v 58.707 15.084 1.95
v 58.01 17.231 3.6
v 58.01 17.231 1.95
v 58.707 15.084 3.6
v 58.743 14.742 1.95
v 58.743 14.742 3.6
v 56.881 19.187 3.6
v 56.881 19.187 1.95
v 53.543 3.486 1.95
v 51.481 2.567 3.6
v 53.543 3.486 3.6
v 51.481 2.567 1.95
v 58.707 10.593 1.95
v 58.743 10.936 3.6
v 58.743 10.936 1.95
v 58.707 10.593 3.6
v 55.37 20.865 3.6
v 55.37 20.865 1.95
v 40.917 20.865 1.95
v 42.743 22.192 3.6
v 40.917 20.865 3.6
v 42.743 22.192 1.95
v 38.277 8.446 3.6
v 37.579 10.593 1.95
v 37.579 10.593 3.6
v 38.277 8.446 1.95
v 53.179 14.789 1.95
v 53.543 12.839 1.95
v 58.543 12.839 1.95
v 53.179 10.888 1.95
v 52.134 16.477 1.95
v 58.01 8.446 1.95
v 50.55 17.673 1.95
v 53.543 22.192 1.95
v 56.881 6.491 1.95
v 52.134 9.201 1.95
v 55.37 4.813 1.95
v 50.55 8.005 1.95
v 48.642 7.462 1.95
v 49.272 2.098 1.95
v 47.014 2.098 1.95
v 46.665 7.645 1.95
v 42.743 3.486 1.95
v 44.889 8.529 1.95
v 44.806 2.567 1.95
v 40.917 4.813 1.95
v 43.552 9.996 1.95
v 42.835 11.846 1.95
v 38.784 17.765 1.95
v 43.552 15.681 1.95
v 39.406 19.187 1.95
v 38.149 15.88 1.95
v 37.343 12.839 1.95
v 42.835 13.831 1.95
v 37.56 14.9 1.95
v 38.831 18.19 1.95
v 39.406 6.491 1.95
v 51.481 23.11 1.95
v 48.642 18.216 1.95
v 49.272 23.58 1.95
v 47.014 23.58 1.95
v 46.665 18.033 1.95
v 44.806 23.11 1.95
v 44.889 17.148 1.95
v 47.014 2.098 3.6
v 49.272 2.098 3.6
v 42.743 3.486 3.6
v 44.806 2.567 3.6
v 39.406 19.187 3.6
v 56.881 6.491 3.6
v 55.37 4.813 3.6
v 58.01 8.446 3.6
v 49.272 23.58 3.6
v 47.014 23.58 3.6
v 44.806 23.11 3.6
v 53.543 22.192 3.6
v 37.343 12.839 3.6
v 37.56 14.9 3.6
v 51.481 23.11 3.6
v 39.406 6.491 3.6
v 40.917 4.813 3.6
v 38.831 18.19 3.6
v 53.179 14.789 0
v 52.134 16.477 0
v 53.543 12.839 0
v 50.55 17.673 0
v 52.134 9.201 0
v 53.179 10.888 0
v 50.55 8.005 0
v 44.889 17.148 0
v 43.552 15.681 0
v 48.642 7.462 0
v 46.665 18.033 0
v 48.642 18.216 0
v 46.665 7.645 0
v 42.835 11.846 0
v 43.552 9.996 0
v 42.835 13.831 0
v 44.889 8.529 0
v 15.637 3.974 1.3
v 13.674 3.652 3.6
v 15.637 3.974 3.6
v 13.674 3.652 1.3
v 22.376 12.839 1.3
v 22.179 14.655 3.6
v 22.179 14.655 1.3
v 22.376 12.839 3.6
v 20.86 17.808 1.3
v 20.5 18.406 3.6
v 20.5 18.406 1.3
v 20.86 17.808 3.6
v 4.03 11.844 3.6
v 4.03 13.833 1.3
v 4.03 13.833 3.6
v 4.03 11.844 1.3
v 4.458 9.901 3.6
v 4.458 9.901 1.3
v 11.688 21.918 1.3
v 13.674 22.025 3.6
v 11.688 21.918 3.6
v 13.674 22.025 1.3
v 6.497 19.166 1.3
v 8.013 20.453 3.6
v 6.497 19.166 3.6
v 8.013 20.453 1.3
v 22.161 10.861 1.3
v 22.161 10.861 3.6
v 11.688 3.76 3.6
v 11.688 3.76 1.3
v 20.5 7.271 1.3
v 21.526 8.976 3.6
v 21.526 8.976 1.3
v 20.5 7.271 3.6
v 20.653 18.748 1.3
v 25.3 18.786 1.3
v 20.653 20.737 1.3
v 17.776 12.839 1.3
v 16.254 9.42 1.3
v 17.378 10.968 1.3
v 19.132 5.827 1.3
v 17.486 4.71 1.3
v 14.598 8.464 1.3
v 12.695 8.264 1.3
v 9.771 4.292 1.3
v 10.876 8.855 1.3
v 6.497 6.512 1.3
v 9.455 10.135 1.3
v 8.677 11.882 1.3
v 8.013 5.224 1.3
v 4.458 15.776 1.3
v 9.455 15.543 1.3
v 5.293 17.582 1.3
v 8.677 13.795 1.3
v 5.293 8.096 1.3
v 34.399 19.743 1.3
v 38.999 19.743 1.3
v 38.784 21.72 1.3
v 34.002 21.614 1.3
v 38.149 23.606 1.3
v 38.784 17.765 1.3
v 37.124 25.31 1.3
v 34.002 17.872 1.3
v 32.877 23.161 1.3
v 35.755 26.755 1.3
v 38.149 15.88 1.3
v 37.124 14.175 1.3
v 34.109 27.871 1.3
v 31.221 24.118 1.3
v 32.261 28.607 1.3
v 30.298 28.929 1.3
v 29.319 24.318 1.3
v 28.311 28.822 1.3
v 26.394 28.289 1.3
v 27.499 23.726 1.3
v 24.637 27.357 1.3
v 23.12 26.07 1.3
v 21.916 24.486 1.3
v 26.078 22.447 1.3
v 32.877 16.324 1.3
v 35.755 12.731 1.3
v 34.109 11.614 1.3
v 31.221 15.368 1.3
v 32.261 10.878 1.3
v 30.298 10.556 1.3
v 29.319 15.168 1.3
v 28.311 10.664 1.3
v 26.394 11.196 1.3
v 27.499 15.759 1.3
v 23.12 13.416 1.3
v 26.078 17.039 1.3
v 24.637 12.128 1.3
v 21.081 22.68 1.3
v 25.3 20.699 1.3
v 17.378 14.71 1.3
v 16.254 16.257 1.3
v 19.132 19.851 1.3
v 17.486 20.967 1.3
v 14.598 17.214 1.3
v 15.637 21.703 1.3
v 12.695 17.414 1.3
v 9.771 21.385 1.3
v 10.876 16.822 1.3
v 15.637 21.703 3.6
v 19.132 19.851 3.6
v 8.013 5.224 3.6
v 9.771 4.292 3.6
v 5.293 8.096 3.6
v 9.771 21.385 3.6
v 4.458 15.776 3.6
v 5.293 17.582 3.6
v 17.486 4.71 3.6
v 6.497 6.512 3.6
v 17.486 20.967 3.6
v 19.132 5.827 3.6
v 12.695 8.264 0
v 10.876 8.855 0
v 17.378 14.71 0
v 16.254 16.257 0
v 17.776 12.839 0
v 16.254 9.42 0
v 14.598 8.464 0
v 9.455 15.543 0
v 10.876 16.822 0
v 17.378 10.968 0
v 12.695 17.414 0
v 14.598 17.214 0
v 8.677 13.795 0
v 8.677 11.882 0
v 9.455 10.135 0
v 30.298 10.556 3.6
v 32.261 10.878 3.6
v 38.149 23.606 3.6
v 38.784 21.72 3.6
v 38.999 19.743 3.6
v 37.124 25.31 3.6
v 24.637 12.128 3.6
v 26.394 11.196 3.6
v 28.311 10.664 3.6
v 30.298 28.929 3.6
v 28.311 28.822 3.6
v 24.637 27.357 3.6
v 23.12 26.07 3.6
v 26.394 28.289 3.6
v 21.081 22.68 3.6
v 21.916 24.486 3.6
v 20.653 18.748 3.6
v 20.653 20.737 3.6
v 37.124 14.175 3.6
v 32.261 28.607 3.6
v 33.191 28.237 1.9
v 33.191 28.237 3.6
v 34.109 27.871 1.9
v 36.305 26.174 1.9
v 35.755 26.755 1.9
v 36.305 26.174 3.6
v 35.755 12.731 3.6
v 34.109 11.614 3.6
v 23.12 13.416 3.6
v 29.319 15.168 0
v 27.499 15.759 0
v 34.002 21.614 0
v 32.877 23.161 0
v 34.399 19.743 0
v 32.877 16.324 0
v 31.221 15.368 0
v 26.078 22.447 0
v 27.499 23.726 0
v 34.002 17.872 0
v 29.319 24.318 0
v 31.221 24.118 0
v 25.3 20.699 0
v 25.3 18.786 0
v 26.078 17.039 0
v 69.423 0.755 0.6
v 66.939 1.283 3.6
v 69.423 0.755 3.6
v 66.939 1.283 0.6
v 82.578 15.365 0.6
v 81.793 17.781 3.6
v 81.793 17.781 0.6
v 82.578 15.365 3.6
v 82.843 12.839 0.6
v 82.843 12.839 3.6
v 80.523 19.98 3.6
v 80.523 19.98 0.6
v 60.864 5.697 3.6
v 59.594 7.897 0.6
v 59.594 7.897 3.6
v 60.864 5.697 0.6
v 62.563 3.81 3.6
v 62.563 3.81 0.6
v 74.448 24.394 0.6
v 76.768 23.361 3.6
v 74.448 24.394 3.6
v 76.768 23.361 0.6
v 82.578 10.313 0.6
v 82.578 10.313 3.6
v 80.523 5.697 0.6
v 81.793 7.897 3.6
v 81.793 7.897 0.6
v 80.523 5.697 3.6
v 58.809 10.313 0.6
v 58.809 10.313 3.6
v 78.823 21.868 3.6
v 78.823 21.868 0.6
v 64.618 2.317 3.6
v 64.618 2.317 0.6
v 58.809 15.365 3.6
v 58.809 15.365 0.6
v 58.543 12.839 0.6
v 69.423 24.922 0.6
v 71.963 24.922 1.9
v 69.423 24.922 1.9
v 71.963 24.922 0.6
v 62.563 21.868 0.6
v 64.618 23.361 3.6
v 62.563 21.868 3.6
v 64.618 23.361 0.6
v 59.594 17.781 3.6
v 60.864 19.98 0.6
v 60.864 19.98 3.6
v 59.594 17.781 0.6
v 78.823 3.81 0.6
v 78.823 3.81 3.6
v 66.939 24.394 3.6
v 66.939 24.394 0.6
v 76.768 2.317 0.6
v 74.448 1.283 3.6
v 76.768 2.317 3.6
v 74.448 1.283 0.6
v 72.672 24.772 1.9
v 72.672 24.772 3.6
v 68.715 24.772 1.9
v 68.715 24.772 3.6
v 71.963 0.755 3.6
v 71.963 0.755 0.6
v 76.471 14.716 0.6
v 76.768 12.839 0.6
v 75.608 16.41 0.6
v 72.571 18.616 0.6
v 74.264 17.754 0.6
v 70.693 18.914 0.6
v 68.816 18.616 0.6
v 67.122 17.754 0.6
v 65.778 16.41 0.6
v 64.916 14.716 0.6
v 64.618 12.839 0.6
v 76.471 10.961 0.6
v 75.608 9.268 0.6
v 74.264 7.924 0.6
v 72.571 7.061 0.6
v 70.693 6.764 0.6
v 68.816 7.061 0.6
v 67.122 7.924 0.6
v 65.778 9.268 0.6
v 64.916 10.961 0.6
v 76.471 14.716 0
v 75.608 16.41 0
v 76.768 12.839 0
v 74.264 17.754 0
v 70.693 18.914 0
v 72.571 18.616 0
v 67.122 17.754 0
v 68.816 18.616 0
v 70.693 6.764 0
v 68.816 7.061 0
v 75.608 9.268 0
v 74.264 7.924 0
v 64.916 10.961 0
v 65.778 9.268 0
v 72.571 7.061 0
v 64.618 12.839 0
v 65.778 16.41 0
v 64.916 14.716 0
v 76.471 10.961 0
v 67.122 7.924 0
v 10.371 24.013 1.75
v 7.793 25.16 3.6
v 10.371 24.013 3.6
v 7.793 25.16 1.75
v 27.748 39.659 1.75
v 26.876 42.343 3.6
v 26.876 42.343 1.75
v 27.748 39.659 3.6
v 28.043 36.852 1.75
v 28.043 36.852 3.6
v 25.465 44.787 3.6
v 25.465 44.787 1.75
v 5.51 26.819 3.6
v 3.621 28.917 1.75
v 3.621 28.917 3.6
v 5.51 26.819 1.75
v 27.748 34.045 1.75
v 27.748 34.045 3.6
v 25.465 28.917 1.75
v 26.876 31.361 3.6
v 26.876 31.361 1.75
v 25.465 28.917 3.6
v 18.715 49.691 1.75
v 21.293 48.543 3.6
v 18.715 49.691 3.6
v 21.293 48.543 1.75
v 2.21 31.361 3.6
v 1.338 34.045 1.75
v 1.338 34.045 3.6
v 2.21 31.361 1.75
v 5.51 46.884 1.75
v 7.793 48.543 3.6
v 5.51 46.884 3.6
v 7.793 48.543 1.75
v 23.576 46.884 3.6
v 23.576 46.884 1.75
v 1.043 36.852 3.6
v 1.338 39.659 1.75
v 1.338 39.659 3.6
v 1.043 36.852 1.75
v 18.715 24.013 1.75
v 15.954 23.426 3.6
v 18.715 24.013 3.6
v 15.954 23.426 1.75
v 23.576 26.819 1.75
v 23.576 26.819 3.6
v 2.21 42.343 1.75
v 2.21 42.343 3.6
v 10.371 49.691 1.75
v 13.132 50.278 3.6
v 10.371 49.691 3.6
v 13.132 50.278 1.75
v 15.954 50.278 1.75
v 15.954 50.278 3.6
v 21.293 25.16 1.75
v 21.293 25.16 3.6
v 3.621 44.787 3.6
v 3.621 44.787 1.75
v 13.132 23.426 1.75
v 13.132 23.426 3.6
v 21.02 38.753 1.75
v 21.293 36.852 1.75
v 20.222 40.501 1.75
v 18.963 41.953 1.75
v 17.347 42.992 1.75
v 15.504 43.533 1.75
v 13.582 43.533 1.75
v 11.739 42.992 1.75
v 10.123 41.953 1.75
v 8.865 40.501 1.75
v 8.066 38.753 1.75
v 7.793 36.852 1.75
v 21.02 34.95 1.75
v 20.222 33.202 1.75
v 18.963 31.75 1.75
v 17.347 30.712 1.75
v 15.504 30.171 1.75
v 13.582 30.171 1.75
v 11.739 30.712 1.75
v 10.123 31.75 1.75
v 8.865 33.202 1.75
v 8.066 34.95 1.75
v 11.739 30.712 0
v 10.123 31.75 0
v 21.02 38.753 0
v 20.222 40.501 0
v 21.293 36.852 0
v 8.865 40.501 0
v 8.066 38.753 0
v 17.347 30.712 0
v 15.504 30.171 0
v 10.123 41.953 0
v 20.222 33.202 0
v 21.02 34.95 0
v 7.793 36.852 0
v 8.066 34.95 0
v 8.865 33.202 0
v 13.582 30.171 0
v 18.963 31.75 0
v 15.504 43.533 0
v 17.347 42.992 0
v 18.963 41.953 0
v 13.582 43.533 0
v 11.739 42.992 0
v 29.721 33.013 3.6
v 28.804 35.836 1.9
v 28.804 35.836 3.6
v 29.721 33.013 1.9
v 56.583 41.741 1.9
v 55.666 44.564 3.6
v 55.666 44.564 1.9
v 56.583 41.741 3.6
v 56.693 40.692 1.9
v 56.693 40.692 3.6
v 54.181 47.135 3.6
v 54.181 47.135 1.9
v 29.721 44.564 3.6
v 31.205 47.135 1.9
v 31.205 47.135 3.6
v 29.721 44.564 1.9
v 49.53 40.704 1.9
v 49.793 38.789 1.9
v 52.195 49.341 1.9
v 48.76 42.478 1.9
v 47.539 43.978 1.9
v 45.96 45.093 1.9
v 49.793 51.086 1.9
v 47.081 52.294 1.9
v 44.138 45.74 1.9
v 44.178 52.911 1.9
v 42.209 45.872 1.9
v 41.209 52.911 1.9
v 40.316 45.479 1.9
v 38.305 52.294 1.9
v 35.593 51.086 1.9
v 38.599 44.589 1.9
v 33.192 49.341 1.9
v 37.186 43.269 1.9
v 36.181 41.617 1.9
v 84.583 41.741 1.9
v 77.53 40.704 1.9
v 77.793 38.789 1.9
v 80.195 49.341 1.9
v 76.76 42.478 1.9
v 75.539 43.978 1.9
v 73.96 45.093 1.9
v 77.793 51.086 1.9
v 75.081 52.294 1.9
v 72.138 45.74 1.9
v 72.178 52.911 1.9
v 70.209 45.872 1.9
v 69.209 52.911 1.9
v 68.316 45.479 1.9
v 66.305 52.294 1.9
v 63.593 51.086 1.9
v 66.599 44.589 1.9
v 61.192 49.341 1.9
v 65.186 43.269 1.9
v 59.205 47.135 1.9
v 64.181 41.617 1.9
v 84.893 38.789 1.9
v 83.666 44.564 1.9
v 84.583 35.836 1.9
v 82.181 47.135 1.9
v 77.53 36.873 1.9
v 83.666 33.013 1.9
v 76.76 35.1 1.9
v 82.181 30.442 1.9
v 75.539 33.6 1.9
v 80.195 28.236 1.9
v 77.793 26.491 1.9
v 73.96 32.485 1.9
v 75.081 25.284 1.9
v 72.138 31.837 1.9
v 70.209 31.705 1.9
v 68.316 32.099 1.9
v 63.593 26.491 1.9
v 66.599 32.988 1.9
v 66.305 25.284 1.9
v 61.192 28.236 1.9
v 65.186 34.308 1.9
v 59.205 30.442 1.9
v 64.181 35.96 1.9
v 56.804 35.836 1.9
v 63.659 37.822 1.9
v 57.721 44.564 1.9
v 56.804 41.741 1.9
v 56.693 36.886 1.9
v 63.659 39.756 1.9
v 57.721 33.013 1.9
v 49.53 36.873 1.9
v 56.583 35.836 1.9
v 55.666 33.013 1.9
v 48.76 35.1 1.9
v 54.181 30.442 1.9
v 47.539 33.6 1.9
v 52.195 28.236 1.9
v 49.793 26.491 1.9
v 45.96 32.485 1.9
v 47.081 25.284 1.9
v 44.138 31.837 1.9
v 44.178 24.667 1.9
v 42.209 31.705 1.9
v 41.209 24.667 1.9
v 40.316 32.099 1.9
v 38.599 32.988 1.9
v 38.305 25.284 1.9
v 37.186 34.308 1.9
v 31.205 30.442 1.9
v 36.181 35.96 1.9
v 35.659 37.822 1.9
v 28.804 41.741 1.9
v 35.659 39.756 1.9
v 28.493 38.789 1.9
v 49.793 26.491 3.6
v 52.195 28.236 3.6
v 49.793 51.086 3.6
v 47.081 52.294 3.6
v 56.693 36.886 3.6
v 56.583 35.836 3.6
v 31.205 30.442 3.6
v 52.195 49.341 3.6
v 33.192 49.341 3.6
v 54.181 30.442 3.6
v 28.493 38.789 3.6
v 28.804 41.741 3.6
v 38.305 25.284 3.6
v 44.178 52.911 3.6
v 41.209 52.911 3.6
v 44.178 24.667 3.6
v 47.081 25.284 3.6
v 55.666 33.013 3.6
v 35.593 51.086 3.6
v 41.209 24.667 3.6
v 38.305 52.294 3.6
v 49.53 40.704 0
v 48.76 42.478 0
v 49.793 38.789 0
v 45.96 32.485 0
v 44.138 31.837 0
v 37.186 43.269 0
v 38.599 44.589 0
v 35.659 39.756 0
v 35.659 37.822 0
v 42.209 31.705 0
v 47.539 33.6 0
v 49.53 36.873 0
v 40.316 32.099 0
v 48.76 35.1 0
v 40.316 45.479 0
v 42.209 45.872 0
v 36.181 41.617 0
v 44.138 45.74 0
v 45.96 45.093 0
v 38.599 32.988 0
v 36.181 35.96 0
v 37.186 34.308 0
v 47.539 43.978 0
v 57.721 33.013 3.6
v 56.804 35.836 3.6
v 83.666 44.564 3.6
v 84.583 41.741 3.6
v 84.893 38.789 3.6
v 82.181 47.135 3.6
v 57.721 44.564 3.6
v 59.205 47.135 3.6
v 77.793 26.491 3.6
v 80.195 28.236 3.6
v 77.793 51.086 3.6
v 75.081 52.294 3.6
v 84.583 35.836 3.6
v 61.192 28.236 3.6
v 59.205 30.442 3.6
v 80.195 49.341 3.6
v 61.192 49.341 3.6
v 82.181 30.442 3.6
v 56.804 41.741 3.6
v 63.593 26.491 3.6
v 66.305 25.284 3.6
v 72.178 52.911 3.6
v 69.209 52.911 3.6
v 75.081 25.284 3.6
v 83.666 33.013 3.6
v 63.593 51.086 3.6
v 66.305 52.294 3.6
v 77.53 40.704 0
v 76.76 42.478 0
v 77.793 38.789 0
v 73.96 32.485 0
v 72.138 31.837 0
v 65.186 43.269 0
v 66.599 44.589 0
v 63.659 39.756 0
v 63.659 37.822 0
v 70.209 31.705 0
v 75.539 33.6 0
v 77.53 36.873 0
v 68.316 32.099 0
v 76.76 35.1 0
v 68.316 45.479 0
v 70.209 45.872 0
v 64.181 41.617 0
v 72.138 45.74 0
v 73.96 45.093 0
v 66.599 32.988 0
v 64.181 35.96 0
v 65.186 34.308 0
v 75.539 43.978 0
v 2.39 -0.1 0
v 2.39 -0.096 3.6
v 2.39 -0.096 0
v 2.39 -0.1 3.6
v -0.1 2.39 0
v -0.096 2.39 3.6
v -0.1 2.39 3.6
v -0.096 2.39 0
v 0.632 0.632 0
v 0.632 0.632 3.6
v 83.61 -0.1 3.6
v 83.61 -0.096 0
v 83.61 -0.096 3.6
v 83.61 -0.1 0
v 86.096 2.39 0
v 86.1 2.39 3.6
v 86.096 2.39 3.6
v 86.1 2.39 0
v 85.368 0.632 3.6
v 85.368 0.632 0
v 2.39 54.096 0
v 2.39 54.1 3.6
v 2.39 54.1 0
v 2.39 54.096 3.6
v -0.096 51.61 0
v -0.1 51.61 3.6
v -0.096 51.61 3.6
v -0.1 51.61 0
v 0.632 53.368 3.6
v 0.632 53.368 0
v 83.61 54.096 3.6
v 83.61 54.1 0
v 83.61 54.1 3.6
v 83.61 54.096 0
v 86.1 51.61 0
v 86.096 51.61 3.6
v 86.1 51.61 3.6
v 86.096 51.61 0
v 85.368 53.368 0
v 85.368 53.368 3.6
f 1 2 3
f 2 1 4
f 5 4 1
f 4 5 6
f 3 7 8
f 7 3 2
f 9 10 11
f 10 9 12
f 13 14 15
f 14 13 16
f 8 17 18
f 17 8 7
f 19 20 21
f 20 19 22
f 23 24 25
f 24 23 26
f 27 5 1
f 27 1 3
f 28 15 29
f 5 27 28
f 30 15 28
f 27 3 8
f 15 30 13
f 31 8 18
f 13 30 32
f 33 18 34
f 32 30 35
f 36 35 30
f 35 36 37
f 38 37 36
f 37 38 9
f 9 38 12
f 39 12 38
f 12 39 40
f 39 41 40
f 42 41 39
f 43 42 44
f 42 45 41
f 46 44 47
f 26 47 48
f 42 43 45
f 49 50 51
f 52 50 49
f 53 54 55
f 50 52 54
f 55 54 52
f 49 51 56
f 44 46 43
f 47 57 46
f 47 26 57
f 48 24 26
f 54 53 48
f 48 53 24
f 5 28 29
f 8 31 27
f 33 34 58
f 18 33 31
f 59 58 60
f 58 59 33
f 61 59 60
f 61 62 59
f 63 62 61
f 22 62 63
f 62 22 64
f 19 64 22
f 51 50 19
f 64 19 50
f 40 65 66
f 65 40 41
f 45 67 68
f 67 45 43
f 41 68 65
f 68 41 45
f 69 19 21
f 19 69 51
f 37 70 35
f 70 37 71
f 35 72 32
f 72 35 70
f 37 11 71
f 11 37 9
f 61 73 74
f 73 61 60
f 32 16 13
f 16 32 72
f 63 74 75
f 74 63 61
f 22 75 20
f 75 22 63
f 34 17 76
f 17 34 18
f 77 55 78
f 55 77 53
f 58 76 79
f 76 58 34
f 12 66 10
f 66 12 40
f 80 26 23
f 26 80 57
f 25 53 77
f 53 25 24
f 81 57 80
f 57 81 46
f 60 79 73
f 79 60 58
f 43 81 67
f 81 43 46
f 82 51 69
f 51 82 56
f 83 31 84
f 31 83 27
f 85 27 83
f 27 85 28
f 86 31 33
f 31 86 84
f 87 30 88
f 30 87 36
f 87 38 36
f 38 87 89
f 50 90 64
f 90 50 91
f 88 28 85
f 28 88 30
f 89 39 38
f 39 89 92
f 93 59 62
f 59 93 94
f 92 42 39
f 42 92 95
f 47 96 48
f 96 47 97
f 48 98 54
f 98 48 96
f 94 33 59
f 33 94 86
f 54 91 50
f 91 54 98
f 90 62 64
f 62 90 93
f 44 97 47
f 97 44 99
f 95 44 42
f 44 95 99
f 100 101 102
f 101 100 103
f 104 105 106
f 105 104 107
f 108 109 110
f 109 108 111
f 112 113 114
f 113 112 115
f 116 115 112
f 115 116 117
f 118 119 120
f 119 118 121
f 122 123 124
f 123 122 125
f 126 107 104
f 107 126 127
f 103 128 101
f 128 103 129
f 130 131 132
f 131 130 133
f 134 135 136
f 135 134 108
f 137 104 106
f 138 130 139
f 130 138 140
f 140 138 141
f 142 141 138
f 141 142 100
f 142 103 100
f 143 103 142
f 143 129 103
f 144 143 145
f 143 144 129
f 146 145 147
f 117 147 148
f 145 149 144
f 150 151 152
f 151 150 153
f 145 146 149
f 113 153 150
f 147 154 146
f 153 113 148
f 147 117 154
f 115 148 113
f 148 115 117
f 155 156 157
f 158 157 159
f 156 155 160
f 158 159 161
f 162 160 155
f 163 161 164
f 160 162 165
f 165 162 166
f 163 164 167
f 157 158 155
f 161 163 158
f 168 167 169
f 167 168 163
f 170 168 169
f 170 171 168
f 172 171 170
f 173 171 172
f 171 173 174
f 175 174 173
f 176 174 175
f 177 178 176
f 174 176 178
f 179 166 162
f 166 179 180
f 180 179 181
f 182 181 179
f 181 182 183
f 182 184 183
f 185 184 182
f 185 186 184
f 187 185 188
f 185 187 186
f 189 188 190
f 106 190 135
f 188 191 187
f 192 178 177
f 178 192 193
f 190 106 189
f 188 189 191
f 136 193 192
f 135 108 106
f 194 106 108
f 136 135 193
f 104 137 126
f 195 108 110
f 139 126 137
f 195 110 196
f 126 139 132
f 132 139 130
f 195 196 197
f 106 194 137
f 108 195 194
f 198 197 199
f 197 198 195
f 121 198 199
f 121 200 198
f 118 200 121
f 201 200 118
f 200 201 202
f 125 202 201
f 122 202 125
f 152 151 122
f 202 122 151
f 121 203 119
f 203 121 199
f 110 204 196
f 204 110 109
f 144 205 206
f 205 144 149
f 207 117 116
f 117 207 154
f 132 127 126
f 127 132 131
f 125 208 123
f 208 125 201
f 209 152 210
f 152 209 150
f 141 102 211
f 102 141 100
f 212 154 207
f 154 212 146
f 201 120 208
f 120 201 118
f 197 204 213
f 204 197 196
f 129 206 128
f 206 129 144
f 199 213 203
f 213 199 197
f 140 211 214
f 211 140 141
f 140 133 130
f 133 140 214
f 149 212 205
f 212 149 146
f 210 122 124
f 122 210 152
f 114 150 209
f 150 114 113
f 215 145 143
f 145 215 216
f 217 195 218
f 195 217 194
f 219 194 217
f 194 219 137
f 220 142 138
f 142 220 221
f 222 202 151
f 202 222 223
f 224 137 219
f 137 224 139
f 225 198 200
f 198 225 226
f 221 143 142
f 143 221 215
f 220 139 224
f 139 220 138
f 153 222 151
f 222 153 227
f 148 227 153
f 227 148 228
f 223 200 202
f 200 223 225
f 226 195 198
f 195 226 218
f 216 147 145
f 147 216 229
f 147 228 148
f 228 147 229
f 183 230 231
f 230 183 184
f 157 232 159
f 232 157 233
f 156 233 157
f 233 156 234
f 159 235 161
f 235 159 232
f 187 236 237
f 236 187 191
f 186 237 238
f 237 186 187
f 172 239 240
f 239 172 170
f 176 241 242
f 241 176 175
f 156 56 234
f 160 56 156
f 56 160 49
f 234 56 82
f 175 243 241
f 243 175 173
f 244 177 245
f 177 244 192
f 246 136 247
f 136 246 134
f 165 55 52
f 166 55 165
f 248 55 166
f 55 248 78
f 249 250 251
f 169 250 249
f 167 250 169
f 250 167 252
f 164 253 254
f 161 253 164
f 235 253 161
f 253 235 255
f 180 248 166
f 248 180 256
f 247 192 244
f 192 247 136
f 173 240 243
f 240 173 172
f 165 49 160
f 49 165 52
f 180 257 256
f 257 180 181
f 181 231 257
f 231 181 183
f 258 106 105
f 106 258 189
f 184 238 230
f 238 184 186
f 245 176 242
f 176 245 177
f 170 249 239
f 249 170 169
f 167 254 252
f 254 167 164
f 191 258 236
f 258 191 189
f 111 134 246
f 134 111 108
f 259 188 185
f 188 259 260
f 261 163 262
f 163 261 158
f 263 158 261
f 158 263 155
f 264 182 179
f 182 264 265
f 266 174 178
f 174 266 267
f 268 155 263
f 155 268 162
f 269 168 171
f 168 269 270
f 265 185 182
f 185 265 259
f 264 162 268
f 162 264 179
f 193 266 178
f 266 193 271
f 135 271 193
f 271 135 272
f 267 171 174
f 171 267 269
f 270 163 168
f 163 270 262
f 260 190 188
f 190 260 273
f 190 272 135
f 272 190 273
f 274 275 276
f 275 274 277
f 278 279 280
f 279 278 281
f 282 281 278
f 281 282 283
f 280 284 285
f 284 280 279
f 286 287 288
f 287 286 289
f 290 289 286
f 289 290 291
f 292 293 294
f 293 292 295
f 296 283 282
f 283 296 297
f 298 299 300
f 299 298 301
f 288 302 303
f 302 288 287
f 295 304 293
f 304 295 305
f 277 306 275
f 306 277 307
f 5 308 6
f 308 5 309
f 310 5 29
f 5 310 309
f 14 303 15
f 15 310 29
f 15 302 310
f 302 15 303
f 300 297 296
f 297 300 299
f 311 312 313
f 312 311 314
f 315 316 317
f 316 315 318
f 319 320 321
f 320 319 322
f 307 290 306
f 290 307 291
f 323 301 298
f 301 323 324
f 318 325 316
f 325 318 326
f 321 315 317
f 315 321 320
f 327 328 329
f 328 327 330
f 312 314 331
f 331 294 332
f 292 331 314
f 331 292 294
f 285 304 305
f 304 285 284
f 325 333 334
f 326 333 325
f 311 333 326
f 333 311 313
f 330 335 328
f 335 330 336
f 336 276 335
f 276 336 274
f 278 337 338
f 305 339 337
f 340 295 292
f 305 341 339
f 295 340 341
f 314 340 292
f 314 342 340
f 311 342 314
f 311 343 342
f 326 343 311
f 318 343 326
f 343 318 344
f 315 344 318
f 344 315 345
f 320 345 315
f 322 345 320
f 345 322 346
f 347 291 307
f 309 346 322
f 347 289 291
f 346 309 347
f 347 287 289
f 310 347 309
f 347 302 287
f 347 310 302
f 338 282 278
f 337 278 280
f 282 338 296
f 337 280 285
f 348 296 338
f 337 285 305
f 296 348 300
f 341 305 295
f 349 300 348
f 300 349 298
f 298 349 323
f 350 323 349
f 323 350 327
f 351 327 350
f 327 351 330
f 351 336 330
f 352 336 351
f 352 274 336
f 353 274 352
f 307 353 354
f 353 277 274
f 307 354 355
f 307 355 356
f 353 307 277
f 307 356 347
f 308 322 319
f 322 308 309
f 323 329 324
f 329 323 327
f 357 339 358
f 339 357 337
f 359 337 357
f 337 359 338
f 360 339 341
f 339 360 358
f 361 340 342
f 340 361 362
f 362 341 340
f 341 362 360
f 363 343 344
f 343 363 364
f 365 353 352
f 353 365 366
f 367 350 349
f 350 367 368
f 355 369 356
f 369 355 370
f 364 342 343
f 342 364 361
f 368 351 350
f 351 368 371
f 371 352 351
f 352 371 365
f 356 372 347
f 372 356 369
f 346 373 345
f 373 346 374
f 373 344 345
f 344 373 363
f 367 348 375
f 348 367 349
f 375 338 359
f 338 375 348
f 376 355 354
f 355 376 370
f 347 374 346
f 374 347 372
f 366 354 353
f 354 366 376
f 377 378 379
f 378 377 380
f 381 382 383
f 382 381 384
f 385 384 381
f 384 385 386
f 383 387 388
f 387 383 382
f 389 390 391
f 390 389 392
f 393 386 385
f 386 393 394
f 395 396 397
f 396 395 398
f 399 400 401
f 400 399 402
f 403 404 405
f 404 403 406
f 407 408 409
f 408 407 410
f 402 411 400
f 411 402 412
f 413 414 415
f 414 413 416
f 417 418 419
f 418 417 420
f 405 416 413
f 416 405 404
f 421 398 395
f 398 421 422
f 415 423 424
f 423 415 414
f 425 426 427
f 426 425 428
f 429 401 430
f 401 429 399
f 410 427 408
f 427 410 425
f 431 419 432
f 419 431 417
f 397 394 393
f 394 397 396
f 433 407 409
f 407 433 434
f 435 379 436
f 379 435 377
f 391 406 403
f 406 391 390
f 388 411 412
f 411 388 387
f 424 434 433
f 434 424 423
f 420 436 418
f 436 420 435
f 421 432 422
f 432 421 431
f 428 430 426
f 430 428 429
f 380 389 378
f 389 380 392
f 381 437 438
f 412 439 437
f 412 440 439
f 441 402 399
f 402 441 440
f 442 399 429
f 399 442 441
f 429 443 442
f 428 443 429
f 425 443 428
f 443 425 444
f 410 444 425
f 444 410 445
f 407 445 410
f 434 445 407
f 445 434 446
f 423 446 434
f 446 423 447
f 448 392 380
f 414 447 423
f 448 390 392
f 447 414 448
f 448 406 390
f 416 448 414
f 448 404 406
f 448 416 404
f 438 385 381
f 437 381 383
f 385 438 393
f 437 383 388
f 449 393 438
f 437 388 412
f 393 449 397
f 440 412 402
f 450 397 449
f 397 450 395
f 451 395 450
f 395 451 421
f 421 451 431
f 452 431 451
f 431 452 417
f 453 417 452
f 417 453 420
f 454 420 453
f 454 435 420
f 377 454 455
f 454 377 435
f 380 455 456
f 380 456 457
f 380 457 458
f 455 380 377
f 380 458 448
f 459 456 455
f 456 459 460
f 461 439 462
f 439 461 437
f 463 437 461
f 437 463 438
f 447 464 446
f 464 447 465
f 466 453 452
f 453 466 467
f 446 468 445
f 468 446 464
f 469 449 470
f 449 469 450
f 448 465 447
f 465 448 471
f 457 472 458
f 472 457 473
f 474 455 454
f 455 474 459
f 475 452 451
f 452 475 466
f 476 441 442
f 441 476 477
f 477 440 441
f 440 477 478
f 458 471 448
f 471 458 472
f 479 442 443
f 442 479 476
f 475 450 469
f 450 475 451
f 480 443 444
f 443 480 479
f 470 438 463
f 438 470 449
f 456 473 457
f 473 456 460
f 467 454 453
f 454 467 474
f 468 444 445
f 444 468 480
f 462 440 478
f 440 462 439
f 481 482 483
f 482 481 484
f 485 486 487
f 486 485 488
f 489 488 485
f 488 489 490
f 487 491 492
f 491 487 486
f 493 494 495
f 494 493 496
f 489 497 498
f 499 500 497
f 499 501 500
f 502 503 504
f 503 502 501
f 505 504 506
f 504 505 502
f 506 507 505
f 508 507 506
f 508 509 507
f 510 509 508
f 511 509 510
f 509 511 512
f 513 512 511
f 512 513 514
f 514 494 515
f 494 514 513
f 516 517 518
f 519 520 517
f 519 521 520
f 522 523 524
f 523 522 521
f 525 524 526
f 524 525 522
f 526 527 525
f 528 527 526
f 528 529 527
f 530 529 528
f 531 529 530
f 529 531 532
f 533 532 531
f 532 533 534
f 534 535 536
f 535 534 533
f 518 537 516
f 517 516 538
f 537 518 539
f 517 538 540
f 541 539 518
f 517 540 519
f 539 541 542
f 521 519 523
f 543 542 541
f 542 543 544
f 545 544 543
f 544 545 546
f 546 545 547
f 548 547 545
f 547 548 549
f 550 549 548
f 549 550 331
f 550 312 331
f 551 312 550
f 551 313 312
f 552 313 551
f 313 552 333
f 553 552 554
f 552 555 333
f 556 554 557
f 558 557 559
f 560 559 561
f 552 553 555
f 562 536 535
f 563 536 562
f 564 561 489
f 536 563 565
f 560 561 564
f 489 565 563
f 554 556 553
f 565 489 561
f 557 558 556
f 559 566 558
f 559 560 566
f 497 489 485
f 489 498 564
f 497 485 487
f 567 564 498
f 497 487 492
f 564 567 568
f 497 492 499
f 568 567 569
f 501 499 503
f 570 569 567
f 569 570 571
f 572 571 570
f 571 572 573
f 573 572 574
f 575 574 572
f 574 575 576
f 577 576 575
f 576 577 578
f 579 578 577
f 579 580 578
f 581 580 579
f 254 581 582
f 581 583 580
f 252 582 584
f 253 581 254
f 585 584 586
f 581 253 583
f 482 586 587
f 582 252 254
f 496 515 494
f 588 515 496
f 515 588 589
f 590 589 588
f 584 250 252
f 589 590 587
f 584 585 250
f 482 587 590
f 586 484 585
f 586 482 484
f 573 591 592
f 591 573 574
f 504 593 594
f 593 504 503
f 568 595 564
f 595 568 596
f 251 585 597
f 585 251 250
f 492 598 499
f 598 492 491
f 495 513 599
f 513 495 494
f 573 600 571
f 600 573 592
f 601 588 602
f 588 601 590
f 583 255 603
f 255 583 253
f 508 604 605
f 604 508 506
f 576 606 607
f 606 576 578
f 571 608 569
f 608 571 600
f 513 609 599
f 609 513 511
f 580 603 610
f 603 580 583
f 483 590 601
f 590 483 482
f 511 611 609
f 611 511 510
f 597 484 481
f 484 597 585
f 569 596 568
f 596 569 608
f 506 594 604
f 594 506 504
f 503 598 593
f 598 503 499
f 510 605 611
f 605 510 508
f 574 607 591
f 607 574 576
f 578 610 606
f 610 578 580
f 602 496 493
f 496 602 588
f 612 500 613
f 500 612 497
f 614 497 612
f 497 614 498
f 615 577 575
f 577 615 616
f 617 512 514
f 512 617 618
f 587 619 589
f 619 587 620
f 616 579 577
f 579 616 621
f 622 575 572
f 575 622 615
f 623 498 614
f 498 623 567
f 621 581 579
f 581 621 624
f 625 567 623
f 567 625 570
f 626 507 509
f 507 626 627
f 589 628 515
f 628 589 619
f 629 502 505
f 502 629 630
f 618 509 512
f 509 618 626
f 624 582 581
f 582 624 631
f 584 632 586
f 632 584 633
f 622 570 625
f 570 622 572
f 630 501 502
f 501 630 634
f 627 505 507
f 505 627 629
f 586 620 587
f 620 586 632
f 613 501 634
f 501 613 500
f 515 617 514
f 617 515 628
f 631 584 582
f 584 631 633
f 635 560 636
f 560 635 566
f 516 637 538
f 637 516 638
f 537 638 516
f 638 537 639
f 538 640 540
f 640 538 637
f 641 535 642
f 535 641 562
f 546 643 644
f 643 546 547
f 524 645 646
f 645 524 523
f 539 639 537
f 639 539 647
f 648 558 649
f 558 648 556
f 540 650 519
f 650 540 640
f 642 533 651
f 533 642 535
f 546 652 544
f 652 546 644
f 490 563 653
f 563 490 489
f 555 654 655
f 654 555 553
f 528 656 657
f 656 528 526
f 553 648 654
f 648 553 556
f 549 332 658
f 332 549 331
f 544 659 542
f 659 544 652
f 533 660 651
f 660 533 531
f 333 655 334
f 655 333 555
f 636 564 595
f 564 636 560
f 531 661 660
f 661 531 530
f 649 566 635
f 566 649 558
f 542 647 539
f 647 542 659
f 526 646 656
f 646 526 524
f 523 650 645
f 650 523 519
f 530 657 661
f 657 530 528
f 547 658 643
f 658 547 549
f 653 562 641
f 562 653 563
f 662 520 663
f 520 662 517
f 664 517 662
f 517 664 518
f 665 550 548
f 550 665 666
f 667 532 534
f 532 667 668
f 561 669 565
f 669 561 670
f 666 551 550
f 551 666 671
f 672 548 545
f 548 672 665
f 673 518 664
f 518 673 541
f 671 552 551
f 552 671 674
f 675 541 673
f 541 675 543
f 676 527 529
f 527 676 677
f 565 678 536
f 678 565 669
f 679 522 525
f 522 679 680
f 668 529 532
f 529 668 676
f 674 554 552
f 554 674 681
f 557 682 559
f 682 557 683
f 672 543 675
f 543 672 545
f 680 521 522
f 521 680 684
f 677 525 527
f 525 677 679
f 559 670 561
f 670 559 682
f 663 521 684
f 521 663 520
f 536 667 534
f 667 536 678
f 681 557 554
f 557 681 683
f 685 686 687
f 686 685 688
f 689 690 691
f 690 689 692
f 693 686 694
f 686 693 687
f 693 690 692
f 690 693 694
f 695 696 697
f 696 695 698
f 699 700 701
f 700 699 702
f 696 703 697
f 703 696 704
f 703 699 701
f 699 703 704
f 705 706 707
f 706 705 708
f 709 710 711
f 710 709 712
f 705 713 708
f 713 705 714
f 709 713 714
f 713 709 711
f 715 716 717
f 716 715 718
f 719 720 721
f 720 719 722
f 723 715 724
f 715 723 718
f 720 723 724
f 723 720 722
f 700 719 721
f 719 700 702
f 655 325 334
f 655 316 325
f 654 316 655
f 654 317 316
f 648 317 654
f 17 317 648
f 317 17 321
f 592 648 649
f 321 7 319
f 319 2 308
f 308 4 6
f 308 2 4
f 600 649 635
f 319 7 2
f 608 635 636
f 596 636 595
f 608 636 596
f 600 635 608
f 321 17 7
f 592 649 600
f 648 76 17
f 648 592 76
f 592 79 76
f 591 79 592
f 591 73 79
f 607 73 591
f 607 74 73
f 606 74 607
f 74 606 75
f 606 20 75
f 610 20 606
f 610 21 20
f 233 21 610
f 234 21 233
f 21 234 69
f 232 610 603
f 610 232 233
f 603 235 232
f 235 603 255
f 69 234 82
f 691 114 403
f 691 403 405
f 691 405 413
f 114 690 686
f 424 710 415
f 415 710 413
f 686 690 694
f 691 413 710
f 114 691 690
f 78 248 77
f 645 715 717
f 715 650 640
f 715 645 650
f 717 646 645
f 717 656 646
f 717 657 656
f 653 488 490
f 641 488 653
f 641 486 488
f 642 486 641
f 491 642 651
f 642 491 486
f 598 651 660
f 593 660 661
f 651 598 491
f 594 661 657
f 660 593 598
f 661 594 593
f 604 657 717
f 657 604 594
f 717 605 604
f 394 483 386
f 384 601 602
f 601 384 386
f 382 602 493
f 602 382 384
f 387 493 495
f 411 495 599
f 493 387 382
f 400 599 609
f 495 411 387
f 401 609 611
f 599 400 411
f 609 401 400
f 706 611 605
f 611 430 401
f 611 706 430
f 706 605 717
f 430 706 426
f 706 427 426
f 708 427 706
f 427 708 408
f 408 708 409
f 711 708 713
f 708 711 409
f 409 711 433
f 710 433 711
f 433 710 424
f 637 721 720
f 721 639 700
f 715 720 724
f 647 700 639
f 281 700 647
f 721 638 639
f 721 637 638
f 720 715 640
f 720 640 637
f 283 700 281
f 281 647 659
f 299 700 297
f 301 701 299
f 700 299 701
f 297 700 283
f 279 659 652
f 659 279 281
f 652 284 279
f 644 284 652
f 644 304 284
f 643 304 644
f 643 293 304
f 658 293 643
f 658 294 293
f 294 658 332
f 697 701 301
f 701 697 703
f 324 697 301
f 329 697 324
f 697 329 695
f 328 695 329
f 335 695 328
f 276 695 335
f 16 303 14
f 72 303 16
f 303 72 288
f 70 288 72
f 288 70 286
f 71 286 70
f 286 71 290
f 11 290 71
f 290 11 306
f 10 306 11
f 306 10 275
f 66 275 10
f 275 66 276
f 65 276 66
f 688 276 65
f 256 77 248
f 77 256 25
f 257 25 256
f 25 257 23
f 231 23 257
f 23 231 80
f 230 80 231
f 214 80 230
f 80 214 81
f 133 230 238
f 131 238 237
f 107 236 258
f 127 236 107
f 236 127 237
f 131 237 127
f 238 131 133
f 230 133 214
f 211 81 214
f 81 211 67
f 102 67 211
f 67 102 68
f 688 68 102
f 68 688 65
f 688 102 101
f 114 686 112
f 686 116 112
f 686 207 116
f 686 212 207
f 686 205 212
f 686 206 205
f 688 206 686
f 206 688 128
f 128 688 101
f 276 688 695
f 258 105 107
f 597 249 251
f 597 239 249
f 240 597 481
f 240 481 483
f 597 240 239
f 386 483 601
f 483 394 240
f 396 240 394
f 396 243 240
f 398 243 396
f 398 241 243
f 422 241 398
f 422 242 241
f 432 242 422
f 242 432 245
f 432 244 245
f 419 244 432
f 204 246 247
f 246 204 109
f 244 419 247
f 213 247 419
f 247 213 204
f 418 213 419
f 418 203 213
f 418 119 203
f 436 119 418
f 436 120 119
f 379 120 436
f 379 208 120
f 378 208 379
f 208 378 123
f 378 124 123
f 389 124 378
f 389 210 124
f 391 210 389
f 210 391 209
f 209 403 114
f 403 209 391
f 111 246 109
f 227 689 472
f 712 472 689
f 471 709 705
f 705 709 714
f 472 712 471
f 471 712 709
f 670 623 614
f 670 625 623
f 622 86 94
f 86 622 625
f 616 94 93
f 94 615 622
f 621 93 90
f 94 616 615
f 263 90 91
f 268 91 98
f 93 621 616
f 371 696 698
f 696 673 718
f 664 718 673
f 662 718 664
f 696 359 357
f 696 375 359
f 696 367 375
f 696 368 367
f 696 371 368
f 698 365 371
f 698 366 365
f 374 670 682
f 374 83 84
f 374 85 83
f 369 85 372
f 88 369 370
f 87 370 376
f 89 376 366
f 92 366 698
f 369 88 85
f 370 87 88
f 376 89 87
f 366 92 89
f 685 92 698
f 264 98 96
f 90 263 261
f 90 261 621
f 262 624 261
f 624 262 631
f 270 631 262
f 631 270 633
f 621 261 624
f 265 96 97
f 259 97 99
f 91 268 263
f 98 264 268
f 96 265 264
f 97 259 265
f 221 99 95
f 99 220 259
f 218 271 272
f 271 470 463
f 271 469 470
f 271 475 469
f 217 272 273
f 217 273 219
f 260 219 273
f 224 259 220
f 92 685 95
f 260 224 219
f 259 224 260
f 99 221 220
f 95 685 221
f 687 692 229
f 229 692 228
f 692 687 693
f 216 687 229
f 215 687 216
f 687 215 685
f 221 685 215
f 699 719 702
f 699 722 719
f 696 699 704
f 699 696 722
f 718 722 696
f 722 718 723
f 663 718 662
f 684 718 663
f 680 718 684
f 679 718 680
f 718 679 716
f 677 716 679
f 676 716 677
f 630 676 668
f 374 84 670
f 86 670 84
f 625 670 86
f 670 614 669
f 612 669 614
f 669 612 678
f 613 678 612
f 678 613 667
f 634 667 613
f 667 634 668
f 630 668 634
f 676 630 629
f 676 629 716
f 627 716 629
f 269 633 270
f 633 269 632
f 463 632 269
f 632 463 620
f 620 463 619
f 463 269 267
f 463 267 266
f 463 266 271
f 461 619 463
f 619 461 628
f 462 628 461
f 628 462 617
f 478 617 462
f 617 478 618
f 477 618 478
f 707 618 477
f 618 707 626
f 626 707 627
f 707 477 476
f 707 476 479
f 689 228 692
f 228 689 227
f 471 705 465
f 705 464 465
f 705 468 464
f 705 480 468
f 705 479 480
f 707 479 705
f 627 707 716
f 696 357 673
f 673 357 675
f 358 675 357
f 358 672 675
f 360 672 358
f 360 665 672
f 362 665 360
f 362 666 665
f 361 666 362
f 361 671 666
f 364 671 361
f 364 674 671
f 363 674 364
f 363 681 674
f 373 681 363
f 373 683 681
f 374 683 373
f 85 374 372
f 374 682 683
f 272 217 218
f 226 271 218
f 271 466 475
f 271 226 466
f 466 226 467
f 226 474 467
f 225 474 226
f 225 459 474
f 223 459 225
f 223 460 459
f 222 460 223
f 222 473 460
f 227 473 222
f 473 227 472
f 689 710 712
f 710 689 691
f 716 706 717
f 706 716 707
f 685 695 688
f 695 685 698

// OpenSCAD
h = 3.3000000000000003;
hbp = 0.3;
W = 86.0;
H = 54.0;
B = 0.10000002986498693;
CR = 2.5;
difference(){
    translate(v=[-B, -B, 0]){
        cube([W+2*B, H+2*B, h+hbp]);
    };
    translate(v=[48.1432766072475,12.838731004879353,0]){
        translate(v=[0,0,hbp+h-1.65]) cylinder(h=h*1.1,r=10.6+0.2);
        translate(v=[0,0,-0.05*hbp]) cylinder(h=1.1*hbp+h,r=(10.6+0.2)/2);
    };
    translate(v=[13.176162863571141,12.83873099426297,0]){
        translate(v=[0,0,hbp+h-2.3]) cylinder(h=h*1.1,r=9.0+0.2);
        translate(v=[0,0,-0.05*hbp]) cylinder(h=1.1*hbp+h,r=(9.0+0.2)/2);
    };
    translate(v=[29.799482884531905,19.742731886778714,0]){
        translate(v=[0,0,hbp+h-2.3]) cylinder(h=h*1.1,r=9.0+0.2);
        translate(v=[0,0,-0.05*hbp]) cylinder(h=1.1*hbp+h,r=(9.0+0.2)/2);
    };
    translate(v=[70.69327649887202,12.838730995593806,0]){
        translate(v=[0,0,hbp+h-3.0]) cylinder(h=h*1.1,r=11.95+0.2);
        translate(v=[0,0,-0.05*hbp]) cylinder(h=1.1*hbp+h,r=(11.95+0.2)/2);
    };
    translate(v=[14.543068036682161,36.85179647178384,0]){
        translate(v=[0,0,hbp+h-1.85]) cylinder(h=h*1.1,r=13.3+0.2);
        translate(v=[0,0,-0.05*hbp]) cylinder(h=1.1*hbp+h,r=(13.3+0.2)/2);
    };
    translate(v=[42.69327663153301,38.788730880545266,0]){
        translate(v=[0,0,hbp+h-1.7]) cylinder(h=h*1.1,r=14.0+0.2);
        translate(v=[0,0,-0.05*hbp]) cylinder(h=1.1*hbp+h,r=(14.0+0.2)/2);
    };
    translate(v=[70.69327649739688,38.78873087261294,0]){
        translate(v=[0,0,hbp+h-1.7]) cylinder(h=h*1.1,r=14.0+0.2);
        translate(v=[0,0,-0.05*hbp]) cylinder(h=1.1*hbp+h,r=(14.0+0.2)/2);
    };
    difference(){
        translate(v=[-B-0.01,-B-0.01,-h*0.1]){
            cube([CR, CR, h*1.2+hbp]);
        };
        translate(v=[-B+CR,-B+CR,-h*0.1]){
            cylinder(h=h*1.2+hbp, r=CR);
        };
    };
    difference(){
        translate(v=[W+B-CR+0.01,-B-0.01,-h*0.1]){
            cube([CR, CR, h*1.2+hbp]);
        };
        translate(v=[W+B-CR,-B+CR,-h*0.1]){
            cylinder(h=h*1.2+hbp, r=CR);
        };
    };
    difference(){
        translate(v=[-B-0.01,H+B-CR+0.01,-h*0.1]){
            cube([CR, CR, h*1.2+hbp]);
        };
        translate(v=[-B+CR,H+B-CR,-h*0.1]){
            cylinder(h=h*1.2+hbp, r=CR);
        };
    };
    difference(){
        translate(v=[W+B-CR+0.01,H+B-CR+0.01,-h*0.1]){
            cube([CR, CR, h*1.2+hbp]);
        };
        translate(v=[W+B-CR,H+B-CR,-h*0.1]){
            cylinder(h=h*1.2+hbp, r=CR);
        };
    };
};
